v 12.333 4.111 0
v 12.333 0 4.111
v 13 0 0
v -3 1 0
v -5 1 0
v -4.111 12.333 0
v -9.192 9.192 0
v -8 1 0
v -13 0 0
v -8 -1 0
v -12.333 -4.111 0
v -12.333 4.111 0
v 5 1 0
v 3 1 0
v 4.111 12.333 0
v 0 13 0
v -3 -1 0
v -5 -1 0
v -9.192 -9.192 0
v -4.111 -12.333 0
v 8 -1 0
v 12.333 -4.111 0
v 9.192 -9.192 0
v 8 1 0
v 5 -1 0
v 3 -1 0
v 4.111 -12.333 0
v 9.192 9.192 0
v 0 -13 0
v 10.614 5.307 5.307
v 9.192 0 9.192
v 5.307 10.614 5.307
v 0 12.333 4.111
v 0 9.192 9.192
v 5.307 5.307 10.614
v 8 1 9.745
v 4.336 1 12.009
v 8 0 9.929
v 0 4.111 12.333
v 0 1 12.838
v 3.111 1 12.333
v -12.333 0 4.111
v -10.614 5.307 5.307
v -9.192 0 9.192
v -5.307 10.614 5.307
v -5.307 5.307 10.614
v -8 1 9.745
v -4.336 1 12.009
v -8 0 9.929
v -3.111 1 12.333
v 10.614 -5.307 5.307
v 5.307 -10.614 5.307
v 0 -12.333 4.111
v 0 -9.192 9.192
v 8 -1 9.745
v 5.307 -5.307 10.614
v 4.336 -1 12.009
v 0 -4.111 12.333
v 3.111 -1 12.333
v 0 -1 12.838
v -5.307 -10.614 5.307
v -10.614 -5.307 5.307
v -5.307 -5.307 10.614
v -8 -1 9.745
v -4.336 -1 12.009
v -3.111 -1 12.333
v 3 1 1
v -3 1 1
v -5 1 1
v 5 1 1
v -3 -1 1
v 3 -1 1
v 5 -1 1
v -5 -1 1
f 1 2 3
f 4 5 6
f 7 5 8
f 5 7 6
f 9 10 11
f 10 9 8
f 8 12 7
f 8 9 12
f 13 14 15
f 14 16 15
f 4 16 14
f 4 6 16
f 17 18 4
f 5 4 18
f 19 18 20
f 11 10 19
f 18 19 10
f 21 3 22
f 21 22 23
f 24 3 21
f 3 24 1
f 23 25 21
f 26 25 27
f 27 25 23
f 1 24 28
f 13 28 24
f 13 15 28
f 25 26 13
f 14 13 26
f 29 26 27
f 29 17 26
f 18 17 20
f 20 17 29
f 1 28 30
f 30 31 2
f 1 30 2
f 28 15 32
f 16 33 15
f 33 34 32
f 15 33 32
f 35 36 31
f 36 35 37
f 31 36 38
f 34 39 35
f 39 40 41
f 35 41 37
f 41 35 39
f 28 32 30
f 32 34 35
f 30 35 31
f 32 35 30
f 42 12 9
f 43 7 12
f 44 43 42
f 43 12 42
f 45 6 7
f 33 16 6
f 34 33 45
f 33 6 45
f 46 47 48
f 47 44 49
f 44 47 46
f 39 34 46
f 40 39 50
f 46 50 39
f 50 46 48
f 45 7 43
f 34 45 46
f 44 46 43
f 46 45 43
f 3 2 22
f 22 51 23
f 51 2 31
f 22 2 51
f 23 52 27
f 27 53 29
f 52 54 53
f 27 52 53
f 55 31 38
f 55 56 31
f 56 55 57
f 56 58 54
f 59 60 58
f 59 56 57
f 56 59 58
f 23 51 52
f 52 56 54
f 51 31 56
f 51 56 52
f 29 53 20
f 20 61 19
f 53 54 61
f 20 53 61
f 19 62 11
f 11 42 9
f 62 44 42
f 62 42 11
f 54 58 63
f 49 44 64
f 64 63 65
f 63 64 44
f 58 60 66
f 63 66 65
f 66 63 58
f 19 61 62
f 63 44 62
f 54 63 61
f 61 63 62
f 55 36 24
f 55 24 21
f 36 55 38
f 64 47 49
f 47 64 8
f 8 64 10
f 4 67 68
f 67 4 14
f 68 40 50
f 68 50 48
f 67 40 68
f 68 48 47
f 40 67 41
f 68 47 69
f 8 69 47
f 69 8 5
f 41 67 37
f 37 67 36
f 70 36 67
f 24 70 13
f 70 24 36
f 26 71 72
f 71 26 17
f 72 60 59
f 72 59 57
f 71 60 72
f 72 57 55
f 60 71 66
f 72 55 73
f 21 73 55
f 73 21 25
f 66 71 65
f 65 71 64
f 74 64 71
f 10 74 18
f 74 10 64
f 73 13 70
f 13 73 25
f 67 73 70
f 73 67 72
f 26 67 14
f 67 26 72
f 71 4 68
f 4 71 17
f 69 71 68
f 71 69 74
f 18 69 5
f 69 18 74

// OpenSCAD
// file: common.scad
slot_width=16;
slot_depth=2;
outer_wall=1;
base_height=13;

webbing_cover=40;
webbing_width=0.1;
webbing_dist=2;

module webbing_base() {
     for (i = [0 : webbing_dist : webbing_cover]) {
          translate([i - webbing_width/2, 0, 0]) {
               cube([webbing_width, webbing_cover, base_height]);
          }
          translate([0, i - webbing_width/2, 0]) {
               cube([webbing_cover, webbing_width, base_height]);
          }
     }
}

module webbing() {
     rotate([0, 0, 45]) {
          translate([-webbing_cover/2, -webbing_cover/2, 0]) {
               webbing_base();
          }
     }
}

module slot() {
     translate([0, 0, base_height/2]) {
          cube([slot_width, slot_depth,
                base_height*2], center=true);
     }
}

module slot_wall() {
     translate([0, 0, outer_wall*5]) {
          cube([slot_width+(outer_wall*2), slot_depth+(outer_wall*2),
                base_height+(outer_wall*3)], center=true);
     }
}

module slot_midwall() {
     translate([0, 0, outer_wall*2]) {
          cube([slot_width+outer_wall, slot_depth+outer_wall,
                base_height+outer_wall], center=true);
     }
}

module slot_base() {
     for (t = [slot_width/4, -slot_width/4]) {
          translate([t, 0, outer_wall/2]) {
               cube([slot_depth, slot_depth, outer_wall], center=true);
          }
     }
}
// main file
include <common.scad>;
include <qp.scad>;

module outer() {
     quarter_outer();
     mirror([1,0,0]) quarter_outer();
     mirror([0,1,0]) quarter_outer();
     mirror([1,1,0]) quarter_outer();
}

module inner() {
     quarter_inner();
     mirror([1,0,0]) quarter_inner();
     mirror([0,1,0]) quarter_inner();
     mirror([1,1,0]) quarter_inner();
}

module shell() {
     outer();
}

module main() {
     intersection() {
          outer();
          union() {
               difference() {
                    union() {
                         shell();
                         slot_wall();
                    }
                    slot();
               }
               slot_base();
          }
     }
}

main();
